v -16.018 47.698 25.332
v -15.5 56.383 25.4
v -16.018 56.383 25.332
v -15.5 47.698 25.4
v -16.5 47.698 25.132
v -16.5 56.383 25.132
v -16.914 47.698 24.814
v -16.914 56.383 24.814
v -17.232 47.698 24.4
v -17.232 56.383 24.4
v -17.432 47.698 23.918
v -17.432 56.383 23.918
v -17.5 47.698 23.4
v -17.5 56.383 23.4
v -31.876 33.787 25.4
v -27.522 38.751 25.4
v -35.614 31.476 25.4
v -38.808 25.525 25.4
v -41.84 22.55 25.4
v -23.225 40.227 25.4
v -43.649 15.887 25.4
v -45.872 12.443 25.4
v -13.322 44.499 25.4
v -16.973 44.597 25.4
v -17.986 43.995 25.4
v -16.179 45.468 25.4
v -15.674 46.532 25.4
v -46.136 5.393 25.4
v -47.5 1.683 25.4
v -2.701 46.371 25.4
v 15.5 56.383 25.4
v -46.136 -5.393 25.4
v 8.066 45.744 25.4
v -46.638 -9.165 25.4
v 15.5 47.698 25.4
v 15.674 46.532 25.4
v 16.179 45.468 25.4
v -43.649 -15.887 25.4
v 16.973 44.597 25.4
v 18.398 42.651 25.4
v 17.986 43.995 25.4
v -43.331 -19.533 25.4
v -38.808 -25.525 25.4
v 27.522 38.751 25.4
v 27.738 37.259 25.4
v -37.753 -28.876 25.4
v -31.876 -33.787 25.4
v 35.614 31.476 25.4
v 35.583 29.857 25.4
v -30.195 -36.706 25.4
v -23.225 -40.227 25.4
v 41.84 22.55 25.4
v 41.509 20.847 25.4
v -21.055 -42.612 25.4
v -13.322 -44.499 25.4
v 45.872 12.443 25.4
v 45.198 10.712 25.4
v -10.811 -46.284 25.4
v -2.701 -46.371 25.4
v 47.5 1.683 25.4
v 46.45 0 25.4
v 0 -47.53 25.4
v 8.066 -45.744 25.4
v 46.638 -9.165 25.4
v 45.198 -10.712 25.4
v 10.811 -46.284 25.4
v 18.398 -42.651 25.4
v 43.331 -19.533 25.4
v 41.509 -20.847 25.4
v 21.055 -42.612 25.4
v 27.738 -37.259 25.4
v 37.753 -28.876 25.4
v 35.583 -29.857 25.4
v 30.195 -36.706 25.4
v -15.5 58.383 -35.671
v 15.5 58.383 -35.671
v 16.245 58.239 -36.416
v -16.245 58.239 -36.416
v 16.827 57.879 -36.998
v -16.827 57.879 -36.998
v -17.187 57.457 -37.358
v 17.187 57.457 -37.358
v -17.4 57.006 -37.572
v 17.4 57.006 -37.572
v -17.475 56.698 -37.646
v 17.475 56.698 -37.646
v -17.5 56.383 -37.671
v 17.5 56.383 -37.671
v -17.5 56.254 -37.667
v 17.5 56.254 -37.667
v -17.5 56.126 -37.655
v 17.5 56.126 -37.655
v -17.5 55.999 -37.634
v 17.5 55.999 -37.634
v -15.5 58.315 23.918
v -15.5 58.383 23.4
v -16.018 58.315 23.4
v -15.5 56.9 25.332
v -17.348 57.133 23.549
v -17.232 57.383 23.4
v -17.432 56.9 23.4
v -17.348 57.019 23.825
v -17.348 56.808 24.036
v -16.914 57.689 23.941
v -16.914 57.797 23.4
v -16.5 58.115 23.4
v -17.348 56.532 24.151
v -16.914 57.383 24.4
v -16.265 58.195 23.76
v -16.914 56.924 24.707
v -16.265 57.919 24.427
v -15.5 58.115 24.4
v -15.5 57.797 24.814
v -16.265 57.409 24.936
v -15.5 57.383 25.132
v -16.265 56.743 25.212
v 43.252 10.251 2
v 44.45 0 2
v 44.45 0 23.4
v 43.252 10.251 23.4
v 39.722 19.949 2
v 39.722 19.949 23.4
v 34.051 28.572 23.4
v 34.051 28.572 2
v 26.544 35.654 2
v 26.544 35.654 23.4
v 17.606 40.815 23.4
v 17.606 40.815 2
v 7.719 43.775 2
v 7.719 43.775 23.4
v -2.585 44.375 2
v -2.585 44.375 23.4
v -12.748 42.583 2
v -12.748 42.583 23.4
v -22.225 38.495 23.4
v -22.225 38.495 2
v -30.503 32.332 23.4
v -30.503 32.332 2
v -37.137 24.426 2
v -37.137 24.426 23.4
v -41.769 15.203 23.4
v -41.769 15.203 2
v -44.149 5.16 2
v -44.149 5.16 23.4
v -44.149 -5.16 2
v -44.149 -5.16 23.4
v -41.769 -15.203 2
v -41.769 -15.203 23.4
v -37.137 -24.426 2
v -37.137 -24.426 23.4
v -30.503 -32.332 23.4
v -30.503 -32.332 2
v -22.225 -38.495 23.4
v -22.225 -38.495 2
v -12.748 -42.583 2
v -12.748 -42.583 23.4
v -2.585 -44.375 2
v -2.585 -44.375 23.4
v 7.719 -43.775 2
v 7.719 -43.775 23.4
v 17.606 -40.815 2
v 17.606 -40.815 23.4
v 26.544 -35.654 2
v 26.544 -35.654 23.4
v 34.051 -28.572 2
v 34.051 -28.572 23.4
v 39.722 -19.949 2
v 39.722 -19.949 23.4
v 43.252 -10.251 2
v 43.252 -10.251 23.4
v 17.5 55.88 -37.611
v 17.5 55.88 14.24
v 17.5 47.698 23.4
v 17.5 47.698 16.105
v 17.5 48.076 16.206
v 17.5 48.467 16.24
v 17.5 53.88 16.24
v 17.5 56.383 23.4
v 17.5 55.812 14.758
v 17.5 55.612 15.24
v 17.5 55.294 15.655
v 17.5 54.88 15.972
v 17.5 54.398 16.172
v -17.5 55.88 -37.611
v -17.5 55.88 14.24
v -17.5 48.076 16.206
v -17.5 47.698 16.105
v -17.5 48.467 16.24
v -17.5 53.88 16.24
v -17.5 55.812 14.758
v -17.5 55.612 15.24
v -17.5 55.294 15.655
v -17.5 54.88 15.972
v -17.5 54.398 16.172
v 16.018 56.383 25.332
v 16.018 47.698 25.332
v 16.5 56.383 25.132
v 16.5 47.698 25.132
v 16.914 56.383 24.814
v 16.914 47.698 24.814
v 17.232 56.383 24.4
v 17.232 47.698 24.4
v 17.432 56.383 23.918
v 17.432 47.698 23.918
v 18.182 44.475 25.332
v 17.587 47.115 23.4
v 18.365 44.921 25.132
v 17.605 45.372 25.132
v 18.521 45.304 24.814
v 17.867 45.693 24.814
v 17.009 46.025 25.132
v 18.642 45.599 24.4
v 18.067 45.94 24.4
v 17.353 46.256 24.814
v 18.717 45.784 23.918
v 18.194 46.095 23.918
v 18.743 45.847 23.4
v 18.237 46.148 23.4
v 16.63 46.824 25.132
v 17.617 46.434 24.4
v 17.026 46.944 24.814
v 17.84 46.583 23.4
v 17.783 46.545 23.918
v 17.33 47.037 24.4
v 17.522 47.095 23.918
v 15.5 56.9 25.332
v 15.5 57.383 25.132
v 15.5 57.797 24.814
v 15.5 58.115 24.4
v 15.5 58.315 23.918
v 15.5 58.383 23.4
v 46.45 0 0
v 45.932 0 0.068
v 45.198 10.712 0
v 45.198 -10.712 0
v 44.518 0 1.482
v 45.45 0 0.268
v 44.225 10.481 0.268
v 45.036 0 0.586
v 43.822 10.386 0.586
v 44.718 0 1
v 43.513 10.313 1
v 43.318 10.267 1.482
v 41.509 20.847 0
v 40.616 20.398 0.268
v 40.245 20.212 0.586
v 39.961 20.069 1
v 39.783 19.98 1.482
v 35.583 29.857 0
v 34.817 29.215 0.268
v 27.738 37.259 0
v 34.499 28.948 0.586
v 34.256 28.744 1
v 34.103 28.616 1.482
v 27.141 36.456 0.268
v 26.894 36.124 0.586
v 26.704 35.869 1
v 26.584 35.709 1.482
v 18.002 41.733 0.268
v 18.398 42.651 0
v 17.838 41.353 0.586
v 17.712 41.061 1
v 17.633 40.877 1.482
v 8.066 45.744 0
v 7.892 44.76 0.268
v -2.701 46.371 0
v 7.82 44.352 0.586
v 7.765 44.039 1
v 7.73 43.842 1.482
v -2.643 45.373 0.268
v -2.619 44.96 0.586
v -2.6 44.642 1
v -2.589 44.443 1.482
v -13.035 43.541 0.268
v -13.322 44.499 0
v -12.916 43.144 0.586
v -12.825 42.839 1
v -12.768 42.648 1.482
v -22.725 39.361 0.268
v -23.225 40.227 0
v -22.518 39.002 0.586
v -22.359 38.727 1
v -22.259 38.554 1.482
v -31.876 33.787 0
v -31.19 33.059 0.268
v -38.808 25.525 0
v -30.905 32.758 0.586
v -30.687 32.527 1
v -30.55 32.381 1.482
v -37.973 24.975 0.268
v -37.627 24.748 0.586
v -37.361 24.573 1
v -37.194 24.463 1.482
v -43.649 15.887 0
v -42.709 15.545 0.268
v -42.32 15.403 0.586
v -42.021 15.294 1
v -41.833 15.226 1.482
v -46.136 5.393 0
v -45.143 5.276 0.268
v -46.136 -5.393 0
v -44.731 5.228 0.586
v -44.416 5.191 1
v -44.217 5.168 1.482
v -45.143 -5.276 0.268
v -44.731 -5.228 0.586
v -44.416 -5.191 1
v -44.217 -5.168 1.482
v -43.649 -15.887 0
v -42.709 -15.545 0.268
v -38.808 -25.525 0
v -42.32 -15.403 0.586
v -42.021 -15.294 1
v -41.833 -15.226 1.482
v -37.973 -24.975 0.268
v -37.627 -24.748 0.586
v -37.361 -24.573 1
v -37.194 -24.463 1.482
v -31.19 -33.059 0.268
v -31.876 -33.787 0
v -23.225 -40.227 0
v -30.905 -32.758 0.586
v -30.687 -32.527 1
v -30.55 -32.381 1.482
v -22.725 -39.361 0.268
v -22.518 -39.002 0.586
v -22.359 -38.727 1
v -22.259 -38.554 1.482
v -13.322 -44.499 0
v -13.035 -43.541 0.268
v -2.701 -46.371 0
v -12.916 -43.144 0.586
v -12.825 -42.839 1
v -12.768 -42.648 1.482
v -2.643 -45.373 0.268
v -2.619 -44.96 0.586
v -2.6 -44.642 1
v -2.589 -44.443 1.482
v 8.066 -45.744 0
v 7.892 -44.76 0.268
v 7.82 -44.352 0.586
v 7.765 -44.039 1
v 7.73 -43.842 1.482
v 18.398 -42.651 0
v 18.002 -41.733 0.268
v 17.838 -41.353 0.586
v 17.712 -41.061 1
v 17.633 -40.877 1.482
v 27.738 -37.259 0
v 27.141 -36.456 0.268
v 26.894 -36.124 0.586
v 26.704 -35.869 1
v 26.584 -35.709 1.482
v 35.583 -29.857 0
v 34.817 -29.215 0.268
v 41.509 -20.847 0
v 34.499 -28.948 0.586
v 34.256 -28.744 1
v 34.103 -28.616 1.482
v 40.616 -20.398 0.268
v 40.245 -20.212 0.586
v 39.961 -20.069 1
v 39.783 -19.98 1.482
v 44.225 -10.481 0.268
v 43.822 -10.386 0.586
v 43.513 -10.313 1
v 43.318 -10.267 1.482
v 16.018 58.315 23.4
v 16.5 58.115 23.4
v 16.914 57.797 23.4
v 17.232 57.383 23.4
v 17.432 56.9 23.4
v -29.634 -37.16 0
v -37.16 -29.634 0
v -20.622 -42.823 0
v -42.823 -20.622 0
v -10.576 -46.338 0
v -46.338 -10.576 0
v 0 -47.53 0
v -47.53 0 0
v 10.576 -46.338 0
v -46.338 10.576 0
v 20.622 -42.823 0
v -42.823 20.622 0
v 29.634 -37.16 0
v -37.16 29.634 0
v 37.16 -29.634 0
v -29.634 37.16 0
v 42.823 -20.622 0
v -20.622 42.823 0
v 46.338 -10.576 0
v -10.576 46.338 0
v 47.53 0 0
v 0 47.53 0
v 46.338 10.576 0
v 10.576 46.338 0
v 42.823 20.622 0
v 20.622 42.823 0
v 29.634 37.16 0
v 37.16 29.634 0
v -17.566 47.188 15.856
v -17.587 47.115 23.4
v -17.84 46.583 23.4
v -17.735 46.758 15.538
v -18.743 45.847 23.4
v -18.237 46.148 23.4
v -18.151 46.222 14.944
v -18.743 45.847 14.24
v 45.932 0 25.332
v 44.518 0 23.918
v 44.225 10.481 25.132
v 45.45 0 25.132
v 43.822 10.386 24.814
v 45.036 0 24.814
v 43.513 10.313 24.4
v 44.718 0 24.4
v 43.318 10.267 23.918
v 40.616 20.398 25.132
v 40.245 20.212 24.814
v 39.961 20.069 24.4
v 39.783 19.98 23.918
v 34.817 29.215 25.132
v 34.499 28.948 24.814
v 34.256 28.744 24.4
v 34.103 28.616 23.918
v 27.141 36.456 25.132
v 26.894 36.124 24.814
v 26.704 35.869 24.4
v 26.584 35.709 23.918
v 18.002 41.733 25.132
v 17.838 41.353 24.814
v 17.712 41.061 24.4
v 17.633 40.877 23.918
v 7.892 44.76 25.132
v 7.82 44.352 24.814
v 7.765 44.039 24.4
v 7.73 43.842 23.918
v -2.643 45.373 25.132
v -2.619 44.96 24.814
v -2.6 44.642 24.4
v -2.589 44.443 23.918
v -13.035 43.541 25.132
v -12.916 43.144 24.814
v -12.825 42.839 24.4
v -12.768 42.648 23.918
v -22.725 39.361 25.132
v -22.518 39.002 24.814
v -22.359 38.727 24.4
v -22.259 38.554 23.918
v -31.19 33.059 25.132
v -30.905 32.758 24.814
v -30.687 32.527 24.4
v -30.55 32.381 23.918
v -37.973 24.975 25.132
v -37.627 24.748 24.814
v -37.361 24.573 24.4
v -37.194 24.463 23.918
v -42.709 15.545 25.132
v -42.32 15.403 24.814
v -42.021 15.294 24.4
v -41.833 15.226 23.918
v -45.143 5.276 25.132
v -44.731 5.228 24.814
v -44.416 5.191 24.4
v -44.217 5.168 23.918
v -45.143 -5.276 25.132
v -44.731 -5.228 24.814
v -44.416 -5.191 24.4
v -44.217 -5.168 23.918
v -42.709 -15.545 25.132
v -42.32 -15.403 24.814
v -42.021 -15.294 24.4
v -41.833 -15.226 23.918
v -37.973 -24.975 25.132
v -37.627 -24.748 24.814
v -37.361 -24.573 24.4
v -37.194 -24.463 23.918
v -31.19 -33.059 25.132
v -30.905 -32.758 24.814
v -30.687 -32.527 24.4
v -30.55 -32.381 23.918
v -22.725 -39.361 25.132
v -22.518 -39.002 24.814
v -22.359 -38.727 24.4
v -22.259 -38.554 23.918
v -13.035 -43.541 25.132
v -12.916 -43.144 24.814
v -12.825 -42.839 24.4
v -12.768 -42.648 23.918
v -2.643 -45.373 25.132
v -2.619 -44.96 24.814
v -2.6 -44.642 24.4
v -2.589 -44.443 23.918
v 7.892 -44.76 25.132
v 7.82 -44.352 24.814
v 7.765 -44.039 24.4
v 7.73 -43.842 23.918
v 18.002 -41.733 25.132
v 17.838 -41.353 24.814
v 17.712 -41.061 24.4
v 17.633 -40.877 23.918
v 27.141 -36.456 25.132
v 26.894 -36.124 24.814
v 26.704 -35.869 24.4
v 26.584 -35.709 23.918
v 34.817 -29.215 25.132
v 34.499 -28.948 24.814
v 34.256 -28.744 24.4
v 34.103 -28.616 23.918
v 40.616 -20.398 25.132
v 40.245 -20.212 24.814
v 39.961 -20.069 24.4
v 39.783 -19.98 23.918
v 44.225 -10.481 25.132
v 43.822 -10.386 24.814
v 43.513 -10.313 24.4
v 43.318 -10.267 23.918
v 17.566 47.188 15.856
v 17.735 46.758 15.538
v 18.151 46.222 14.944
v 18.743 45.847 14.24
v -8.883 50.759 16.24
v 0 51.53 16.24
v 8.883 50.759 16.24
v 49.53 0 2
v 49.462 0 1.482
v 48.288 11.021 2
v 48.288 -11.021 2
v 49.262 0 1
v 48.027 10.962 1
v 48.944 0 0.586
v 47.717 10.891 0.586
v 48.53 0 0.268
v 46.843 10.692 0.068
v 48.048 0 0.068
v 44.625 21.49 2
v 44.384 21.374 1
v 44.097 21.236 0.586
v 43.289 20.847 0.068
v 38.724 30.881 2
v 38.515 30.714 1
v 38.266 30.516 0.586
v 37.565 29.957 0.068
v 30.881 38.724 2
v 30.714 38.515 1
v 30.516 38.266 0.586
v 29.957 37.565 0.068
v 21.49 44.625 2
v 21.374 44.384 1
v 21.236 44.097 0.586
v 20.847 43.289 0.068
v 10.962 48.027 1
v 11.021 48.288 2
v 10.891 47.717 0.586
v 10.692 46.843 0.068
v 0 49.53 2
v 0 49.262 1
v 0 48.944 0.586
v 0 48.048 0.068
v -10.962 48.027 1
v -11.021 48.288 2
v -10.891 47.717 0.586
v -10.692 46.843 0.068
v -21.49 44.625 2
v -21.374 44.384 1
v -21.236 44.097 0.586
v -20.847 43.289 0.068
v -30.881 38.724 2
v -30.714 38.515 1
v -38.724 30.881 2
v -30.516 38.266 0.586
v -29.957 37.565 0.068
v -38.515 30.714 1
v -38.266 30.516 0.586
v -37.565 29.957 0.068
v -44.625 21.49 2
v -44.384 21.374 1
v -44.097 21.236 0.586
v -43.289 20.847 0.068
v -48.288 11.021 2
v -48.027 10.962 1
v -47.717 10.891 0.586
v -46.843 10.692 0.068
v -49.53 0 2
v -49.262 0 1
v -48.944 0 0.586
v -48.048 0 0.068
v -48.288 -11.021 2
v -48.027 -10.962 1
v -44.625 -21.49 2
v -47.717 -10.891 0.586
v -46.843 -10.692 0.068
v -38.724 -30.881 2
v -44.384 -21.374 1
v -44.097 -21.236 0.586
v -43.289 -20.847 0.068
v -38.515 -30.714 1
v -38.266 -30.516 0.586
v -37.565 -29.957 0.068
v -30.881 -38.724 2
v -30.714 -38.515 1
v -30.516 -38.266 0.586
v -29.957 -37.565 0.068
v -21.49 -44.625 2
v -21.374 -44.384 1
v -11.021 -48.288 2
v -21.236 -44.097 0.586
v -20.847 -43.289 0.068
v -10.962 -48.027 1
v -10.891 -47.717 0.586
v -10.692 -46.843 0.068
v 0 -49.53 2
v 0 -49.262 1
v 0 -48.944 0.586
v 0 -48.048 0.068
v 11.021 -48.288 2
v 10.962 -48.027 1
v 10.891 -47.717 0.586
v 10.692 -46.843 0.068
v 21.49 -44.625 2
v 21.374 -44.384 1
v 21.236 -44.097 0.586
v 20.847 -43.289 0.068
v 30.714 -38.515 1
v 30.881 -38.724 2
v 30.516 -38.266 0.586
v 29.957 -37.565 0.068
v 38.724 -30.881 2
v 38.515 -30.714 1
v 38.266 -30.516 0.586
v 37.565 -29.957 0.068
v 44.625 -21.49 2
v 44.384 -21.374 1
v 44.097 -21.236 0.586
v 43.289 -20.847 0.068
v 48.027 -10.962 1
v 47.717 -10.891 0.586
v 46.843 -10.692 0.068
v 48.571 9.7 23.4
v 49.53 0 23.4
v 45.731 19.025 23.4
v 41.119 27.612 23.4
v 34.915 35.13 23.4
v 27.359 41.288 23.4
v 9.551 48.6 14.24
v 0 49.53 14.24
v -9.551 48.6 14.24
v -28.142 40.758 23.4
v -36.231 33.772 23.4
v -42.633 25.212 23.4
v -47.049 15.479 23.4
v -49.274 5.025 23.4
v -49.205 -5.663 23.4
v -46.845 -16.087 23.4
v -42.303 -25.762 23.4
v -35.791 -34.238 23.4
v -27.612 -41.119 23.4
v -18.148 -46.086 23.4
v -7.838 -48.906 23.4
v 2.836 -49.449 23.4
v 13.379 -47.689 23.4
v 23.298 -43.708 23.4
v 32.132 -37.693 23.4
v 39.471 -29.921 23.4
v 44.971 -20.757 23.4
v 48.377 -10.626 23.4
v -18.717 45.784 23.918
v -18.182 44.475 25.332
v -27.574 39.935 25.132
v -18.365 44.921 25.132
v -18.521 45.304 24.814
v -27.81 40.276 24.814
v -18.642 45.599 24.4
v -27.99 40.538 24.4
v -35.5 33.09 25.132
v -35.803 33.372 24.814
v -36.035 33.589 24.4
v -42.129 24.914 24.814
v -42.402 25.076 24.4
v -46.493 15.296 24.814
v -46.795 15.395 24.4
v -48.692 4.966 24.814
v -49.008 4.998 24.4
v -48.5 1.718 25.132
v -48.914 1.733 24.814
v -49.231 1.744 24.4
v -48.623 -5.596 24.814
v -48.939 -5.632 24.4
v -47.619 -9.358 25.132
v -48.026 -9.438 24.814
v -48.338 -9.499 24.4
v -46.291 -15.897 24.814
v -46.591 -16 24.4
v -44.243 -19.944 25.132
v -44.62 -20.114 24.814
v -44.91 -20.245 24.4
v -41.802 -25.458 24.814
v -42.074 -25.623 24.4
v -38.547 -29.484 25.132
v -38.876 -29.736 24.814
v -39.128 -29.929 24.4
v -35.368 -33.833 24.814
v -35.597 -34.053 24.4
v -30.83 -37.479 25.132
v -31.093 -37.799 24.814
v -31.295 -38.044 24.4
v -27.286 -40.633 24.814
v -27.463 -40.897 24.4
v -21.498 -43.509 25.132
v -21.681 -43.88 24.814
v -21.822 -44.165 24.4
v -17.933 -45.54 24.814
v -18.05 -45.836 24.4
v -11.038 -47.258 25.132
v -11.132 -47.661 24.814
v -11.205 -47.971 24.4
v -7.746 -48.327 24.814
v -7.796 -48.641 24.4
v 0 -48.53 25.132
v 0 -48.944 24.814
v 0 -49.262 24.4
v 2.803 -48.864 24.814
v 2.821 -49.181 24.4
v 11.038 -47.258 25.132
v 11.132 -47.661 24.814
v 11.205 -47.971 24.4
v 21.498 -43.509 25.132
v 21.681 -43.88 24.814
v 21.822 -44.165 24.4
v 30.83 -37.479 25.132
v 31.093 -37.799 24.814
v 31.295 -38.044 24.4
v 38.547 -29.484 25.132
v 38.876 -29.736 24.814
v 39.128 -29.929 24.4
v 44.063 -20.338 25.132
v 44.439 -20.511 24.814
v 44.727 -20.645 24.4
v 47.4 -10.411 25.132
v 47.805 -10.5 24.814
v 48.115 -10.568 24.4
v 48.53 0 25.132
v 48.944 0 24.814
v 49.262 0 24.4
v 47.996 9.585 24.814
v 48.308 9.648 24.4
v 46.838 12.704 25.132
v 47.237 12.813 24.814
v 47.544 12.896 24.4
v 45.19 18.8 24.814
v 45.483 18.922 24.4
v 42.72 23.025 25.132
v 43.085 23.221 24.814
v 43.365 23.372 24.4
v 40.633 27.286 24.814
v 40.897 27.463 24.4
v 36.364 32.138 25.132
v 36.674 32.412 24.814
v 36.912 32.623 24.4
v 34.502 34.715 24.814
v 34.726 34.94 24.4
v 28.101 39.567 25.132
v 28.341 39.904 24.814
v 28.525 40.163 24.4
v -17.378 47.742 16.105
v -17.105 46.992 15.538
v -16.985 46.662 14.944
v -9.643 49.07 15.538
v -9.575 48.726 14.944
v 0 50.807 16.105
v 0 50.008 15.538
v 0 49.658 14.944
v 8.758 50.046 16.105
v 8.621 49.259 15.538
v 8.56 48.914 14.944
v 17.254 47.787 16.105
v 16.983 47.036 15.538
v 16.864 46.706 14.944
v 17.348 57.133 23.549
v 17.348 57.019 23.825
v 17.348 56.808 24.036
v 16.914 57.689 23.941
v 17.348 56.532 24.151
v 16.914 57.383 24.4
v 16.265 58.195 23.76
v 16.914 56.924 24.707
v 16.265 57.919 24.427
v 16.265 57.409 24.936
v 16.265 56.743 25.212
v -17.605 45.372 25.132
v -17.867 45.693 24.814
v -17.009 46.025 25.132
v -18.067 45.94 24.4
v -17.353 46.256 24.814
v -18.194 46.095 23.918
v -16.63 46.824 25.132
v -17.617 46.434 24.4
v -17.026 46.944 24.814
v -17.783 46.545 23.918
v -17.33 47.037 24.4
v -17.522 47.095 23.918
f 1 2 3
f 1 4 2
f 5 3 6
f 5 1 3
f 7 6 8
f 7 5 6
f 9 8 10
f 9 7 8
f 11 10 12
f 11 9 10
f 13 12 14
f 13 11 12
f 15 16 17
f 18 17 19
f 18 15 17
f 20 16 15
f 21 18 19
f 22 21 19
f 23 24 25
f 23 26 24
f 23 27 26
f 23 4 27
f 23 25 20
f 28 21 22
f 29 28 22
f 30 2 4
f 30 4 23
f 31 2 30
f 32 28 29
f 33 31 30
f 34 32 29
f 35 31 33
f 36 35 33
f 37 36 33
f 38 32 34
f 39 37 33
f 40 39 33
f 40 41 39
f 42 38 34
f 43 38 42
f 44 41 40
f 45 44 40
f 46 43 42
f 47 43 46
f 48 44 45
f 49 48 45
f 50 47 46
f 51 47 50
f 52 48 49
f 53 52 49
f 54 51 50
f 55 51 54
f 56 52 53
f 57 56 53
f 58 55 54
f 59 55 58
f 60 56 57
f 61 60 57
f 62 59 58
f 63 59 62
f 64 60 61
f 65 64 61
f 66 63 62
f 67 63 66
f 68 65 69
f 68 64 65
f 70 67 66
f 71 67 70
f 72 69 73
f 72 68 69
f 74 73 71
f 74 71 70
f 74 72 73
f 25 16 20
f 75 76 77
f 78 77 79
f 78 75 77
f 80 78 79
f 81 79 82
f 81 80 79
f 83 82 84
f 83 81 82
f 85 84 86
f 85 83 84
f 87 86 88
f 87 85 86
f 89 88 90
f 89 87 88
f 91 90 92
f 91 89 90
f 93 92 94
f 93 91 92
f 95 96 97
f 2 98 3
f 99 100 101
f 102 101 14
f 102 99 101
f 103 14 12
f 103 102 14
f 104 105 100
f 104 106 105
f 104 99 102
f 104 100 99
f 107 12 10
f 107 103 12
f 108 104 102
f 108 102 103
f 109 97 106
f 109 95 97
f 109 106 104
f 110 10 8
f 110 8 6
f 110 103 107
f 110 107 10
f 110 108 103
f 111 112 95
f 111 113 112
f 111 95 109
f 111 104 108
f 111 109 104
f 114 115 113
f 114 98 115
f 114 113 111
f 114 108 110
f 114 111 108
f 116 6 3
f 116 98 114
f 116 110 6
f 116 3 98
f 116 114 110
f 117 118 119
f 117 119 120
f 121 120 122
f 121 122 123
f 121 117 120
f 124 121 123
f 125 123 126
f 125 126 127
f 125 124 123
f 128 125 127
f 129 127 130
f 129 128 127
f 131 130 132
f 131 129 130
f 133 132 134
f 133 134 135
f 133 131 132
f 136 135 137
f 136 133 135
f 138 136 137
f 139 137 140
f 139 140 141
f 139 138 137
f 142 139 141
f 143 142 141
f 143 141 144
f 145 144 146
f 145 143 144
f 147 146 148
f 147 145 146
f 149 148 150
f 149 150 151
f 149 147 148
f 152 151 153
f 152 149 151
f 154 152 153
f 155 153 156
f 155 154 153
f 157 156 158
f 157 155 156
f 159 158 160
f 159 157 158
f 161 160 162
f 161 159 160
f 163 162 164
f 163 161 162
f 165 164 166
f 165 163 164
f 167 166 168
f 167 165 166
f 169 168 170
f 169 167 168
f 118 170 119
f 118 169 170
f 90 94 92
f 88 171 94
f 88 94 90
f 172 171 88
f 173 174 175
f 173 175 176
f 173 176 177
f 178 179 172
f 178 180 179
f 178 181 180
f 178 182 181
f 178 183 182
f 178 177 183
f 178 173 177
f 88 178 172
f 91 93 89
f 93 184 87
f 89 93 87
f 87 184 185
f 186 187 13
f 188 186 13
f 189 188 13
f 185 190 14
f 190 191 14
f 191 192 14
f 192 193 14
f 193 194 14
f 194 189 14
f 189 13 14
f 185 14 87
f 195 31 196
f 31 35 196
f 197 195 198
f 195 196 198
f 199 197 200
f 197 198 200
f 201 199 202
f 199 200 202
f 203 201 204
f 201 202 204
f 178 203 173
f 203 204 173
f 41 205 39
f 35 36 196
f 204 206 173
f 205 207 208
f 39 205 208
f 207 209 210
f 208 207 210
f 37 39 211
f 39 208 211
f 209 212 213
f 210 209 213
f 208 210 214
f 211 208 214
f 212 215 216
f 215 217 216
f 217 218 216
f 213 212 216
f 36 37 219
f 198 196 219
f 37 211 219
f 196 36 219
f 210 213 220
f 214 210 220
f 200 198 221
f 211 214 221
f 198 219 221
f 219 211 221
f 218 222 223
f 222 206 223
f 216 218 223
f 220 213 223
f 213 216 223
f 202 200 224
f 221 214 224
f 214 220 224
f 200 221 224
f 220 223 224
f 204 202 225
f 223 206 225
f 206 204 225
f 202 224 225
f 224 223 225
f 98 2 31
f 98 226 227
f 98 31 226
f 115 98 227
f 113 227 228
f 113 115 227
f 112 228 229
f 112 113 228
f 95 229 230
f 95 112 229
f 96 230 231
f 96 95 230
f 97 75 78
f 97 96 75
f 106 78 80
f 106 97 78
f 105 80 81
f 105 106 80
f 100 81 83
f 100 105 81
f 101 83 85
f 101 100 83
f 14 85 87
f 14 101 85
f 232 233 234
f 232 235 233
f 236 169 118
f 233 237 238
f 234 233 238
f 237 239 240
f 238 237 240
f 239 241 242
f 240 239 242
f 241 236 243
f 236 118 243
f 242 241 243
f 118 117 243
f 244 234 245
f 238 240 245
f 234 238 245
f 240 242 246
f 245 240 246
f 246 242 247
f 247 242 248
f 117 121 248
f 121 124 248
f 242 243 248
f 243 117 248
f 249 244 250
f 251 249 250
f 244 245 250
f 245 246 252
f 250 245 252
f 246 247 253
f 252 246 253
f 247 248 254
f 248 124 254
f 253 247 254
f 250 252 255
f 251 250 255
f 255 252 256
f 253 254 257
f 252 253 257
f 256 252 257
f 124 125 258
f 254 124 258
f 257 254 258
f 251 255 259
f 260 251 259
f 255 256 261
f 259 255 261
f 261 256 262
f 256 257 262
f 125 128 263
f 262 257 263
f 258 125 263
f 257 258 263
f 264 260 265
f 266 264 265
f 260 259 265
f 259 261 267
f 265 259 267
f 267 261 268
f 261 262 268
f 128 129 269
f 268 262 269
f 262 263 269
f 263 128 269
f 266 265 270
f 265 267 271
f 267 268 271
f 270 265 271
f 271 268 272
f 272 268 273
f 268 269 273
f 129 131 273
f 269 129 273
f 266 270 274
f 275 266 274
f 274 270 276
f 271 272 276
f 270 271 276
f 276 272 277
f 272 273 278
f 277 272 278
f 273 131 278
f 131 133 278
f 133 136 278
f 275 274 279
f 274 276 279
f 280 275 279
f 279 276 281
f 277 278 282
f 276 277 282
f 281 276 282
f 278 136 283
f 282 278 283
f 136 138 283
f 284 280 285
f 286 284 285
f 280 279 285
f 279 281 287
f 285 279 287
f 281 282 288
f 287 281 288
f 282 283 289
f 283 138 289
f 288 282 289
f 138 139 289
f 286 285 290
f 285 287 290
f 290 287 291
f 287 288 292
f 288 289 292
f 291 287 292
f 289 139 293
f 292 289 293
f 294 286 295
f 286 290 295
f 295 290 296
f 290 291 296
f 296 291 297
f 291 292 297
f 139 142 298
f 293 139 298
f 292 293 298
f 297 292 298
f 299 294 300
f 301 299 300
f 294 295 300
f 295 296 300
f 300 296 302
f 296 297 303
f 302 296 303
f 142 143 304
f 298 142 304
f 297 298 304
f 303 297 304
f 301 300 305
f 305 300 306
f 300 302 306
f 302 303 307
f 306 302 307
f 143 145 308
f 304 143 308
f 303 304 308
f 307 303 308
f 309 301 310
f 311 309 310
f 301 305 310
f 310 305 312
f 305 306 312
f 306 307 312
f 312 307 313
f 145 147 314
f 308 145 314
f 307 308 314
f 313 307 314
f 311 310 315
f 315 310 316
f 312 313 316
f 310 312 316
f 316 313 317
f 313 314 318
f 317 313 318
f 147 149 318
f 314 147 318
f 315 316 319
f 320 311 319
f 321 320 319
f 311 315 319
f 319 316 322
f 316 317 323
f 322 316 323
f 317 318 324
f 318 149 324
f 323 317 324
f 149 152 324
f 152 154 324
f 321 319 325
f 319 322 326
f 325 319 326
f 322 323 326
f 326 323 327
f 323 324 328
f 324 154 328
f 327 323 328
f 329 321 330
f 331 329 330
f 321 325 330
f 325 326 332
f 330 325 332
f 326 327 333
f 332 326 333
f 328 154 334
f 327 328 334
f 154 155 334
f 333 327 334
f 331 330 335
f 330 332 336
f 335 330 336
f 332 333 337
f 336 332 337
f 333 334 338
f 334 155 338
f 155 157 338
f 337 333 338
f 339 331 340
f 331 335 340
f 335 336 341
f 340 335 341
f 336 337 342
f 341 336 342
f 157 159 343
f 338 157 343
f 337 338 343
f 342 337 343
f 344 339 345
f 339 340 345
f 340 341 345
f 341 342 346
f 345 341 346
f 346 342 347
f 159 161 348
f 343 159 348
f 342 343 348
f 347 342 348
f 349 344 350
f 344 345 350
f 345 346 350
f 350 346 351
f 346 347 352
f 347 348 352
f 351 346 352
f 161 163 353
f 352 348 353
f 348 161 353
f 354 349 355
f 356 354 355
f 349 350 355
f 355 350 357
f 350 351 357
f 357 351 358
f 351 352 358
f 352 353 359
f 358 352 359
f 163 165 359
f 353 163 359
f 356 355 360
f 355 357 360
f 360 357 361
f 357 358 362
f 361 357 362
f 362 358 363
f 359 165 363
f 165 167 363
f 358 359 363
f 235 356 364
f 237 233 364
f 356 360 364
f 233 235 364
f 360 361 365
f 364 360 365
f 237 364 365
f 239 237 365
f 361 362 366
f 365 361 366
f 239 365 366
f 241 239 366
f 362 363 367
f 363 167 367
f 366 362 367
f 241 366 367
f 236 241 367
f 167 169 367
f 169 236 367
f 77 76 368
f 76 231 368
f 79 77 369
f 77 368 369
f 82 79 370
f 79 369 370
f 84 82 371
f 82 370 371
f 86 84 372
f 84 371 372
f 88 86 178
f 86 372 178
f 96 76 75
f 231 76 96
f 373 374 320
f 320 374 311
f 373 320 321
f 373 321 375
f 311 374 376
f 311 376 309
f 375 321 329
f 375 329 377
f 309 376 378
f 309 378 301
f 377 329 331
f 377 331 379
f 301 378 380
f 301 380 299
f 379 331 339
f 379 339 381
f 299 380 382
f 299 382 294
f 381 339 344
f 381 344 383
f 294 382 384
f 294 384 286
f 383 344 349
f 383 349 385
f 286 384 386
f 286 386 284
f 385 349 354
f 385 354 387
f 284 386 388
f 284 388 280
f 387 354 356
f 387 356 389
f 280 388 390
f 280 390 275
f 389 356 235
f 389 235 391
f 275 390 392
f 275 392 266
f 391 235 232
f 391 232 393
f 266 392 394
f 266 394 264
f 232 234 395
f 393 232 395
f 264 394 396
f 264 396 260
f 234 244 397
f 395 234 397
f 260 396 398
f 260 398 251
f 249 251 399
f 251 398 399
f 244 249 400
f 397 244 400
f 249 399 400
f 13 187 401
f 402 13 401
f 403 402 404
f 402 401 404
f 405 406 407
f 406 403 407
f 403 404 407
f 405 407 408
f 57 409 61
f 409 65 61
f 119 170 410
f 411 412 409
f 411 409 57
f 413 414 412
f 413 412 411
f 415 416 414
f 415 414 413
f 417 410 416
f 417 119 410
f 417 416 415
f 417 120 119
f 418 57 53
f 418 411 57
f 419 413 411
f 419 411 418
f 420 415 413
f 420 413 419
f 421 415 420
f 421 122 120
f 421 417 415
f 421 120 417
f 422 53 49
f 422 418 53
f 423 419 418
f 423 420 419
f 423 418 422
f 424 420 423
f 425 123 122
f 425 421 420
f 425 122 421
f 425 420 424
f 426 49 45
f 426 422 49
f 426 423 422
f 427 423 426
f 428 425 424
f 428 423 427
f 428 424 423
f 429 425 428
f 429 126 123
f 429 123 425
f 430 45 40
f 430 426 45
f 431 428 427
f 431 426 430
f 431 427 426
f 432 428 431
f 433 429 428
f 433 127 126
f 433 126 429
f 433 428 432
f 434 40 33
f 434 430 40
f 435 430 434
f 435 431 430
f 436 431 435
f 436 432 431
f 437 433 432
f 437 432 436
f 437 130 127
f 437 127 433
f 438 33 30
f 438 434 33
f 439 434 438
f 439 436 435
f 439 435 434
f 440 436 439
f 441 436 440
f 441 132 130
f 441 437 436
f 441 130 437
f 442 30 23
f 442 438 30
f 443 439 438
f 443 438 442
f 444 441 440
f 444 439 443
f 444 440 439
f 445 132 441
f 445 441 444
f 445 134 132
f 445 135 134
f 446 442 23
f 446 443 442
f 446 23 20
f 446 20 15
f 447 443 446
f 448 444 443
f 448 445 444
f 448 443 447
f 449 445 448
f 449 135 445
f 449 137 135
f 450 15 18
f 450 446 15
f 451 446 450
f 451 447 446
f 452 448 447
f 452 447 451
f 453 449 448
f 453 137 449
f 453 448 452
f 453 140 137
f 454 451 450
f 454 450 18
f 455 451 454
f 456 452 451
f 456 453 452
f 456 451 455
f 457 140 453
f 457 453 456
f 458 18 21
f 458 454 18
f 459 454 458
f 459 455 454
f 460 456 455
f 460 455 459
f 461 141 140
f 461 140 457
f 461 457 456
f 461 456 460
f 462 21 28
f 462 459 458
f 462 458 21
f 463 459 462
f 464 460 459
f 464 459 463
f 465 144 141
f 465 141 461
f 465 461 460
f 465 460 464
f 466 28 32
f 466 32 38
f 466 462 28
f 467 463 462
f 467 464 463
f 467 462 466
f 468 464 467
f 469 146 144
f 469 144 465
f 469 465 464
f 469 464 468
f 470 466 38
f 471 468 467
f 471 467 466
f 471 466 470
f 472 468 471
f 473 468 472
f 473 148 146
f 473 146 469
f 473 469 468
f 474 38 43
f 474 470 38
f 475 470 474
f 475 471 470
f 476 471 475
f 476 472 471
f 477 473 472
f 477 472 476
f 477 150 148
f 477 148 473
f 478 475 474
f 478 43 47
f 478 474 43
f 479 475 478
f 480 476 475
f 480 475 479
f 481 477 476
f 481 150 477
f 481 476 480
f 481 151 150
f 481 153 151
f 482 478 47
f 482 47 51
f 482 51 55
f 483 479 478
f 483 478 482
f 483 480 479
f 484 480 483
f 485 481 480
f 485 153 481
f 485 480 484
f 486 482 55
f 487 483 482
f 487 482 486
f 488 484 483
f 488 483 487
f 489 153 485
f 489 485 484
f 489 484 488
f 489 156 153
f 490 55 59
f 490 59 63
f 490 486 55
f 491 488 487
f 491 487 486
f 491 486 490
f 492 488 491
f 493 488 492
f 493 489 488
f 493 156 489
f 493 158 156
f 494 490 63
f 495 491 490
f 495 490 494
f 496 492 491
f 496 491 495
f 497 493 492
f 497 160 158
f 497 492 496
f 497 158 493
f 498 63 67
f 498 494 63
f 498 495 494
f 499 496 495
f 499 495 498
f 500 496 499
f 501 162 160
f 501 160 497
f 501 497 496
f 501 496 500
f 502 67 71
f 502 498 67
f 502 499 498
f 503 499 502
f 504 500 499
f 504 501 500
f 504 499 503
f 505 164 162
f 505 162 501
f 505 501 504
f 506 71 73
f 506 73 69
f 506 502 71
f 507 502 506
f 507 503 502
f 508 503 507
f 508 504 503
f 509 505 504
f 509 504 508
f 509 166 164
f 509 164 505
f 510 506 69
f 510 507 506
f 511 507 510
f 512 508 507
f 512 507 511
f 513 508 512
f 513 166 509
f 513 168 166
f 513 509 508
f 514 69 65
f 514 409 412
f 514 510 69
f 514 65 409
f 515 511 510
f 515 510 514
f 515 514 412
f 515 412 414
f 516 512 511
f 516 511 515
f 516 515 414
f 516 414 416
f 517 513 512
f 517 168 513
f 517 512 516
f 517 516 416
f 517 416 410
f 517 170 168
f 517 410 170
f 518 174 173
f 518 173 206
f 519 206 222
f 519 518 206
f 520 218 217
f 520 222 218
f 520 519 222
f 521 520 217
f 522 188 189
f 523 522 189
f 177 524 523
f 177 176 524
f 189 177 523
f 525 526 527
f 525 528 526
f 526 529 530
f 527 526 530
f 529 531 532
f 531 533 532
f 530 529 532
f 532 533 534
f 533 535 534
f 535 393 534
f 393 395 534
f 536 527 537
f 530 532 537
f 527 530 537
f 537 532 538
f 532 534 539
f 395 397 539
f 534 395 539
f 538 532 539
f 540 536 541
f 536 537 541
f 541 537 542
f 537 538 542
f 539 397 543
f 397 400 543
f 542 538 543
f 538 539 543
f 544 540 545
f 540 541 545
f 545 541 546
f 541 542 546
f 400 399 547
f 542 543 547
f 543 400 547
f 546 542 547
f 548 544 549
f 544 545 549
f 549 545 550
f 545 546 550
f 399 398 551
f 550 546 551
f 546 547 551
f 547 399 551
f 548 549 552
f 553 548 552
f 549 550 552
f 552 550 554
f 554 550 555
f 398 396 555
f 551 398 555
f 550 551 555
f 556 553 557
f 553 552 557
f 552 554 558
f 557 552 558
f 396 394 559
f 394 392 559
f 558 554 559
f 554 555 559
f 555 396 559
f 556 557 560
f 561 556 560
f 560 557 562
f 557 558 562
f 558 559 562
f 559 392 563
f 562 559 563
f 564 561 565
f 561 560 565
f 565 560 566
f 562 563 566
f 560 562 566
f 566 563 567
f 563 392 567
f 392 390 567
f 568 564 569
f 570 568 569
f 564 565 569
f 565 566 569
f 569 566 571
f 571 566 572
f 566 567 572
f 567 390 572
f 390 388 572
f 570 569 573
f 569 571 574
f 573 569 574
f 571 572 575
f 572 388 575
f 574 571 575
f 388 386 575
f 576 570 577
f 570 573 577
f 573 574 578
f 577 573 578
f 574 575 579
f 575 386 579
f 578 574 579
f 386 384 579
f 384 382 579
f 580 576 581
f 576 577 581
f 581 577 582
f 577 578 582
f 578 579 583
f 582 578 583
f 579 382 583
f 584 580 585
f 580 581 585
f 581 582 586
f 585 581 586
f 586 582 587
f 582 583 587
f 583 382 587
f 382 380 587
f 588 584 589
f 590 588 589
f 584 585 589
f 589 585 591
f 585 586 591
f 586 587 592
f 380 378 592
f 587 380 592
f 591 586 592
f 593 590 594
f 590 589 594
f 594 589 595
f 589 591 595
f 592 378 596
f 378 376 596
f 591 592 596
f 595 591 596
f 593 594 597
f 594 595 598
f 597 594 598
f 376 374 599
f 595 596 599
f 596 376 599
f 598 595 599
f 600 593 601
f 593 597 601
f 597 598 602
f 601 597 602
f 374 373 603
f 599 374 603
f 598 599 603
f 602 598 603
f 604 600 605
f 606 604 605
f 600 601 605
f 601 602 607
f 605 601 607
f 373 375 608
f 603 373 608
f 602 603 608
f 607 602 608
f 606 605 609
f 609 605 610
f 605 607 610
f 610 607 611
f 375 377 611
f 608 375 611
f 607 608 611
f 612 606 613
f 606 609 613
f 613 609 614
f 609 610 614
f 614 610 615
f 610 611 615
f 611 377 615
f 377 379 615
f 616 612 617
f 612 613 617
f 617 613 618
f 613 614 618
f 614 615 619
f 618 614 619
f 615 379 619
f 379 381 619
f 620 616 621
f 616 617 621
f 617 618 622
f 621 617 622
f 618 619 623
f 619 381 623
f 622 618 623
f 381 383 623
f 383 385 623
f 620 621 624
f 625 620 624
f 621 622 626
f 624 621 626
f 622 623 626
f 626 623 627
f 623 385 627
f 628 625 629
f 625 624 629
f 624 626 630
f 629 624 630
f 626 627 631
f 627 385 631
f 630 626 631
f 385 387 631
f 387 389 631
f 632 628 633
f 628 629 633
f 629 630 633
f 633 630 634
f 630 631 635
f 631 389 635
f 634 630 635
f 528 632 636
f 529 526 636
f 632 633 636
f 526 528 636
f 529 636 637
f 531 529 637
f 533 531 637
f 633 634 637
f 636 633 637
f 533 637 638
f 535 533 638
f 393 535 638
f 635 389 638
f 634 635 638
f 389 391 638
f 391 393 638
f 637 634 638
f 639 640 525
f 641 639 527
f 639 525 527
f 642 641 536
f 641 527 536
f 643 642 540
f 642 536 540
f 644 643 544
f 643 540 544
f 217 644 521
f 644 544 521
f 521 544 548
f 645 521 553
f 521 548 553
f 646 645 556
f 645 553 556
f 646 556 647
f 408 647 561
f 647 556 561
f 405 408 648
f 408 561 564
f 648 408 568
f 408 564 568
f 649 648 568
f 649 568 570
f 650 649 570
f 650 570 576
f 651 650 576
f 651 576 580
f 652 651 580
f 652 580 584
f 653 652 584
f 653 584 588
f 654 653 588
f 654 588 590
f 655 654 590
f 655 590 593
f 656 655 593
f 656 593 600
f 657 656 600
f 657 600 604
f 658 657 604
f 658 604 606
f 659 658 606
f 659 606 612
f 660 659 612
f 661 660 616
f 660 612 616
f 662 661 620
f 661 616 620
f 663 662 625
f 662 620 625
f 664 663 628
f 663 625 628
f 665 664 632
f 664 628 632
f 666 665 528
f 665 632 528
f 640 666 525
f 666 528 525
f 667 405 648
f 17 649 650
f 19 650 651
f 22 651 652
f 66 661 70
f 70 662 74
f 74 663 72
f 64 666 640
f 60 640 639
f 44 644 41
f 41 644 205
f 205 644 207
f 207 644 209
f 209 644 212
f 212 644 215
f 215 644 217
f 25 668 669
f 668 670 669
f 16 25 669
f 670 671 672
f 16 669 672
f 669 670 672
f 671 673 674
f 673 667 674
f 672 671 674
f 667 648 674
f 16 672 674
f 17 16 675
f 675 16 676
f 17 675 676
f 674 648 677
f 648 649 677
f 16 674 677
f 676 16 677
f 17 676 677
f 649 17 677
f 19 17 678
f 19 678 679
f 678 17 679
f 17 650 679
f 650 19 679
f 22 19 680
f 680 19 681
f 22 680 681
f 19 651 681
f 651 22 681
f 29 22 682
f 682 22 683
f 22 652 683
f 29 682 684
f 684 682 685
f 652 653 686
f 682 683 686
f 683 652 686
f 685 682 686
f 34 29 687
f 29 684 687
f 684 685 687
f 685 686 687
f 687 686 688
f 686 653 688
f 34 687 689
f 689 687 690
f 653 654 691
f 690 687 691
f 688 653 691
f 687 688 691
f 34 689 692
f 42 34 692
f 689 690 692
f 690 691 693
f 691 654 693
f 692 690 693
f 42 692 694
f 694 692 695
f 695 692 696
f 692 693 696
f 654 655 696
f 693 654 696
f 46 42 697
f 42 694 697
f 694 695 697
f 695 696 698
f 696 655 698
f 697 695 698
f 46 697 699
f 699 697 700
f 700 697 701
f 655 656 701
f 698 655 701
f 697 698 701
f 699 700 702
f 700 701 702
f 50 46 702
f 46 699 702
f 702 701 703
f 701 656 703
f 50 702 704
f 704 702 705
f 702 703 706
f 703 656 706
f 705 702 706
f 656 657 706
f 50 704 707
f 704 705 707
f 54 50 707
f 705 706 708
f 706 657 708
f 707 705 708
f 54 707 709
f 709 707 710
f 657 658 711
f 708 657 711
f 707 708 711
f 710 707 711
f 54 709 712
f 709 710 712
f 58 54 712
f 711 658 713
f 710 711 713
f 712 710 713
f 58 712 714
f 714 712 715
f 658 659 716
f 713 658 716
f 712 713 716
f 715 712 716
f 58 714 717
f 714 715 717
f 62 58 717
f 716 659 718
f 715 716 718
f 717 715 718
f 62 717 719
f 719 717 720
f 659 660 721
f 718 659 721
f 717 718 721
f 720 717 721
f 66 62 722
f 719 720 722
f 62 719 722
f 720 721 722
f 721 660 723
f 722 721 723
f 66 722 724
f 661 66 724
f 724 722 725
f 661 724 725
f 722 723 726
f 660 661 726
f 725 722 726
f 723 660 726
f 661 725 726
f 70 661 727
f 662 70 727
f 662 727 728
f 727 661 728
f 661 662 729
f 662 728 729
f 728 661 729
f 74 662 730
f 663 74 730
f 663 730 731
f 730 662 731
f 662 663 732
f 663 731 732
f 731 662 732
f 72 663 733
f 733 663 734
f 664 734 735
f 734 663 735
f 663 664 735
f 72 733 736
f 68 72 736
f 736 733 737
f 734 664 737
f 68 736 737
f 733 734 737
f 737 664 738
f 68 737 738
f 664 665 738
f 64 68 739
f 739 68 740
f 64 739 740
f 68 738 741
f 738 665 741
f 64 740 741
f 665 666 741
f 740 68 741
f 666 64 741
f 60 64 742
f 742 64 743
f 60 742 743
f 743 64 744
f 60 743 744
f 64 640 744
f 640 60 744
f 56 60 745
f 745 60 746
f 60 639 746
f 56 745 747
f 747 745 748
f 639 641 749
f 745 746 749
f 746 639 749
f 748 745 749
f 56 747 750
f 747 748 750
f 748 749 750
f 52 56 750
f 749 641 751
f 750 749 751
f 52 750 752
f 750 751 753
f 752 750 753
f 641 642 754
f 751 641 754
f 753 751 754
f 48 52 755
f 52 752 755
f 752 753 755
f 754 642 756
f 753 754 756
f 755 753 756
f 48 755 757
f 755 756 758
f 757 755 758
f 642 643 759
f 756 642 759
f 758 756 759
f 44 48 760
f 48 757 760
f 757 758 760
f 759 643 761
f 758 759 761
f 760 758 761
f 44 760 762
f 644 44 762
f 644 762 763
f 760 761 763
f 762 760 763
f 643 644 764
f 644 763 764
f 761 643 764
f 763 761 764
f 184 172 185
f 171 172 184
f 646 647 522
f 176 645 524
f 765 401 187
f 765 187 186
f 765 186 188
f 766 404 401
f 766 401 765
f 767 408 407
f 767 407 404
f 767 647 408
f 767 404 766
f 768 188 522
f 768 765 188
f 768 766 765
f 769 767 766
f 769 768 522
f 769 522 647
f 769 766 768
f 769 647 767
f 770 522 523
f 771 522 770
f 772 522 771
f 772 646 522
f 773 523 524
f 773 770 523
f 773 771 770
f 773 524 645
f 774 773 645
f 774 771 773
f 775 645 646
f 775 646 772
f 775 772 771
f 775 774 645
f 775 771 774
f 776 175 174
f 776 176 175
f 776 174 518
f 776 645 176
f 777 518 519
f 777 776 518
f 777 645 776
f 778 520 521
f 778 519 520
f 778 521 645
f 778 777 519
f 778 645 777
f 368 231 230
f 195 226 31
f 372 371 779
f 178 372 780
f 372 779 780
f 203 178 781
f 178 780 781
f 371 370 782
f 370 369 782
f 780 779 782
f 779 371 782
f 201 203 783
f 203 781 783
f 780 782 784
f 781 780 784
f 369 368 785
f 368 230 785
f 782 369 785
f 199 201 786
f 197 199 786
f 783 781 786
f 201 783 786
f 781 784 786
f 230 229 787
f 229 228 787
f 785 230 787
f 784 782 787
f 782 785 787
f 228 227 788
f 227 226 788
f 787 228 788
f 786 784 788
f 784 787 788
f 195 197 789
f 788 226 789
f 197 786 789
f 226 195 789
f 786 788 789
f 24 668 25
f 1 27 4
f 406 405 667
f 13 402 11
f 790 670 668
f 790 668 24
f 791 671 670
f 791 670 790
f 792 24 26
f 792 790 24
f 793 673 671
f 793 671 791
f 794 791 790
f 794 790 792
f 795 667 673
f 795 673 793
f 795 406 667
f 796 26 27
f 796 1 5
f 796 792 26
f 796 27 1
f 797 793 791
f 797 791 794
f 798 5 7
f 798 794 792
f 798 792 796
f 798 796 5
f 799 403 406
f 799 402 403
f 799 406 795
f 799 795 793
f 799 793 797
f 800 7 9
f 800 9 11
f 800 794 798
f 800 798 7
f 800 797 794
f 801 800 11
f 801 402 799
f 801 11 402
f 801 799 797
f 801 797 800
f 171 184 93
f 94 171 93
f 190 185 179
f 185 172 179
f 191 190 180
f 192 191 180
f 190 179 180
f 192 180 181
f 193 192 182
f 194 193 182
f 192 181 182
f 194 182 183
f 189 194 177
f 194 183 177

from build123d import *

# Parameters (mm, degrees)
F0_R     = 49.53
F0_R_2   = 44.45
F1_DEPTH = 25.4
F3_DEPTH = 17.5
F4_R     = 2


with BuildPart() as f1:
    # F0 (on Top) → F1 (new body)
    with BuildSketch(Plane.XY):
        Circle(F0_R)
        Circle(F0_R_2, mode=Mode.SUBTRACT)
    extrude(amount=F1_DEPTH)

    # F2 (on Right) → F3 (join, symmetric)
    with BuildSketch(Plane.YZ):
        Polygon((58.382712847, 25.4), (45.682712847, 25.4), (45.682712847, 16.2404105067), (55.88, 16.2404105067), (55.88, -37.6108922064), (58.382712847, -38.1), align=None)
    extrude(amount=F3_DEPTH, both=True)

    # F4
    f4_edges = [f1.edges().sort_by_distance(p)[0] for p in [
        (0, 55.88, 16.240411),
        (0, 49.53, 16.240411),
        (17.5, 46.335417, 20.820205),
        (-17.5, 46.335417, 20.820205),
        (0, 58.382713, 25.4),
        (-44.45, 0, 25.4),
        (-49.53, 0, 0),
        (49.53, 0, 12.7),
        (-28.164214, -40.743072, 25.4),
        (40.743072, 28.164214, 25.4),
        (44.45, 0, 12.7),
        (-44.45, 0, 0),
        (-17.5, 58.382713, -6.35),
        (17.5, 58.382713, -6.35),
        (0, 58.382713, -38.1),
        (17.5, 52.359065, 25.4),
        (-17.5, 52.359065, 25.4),
    ]]
    fillet(f4_edges, radius=F4_R)


solid = f1.part
